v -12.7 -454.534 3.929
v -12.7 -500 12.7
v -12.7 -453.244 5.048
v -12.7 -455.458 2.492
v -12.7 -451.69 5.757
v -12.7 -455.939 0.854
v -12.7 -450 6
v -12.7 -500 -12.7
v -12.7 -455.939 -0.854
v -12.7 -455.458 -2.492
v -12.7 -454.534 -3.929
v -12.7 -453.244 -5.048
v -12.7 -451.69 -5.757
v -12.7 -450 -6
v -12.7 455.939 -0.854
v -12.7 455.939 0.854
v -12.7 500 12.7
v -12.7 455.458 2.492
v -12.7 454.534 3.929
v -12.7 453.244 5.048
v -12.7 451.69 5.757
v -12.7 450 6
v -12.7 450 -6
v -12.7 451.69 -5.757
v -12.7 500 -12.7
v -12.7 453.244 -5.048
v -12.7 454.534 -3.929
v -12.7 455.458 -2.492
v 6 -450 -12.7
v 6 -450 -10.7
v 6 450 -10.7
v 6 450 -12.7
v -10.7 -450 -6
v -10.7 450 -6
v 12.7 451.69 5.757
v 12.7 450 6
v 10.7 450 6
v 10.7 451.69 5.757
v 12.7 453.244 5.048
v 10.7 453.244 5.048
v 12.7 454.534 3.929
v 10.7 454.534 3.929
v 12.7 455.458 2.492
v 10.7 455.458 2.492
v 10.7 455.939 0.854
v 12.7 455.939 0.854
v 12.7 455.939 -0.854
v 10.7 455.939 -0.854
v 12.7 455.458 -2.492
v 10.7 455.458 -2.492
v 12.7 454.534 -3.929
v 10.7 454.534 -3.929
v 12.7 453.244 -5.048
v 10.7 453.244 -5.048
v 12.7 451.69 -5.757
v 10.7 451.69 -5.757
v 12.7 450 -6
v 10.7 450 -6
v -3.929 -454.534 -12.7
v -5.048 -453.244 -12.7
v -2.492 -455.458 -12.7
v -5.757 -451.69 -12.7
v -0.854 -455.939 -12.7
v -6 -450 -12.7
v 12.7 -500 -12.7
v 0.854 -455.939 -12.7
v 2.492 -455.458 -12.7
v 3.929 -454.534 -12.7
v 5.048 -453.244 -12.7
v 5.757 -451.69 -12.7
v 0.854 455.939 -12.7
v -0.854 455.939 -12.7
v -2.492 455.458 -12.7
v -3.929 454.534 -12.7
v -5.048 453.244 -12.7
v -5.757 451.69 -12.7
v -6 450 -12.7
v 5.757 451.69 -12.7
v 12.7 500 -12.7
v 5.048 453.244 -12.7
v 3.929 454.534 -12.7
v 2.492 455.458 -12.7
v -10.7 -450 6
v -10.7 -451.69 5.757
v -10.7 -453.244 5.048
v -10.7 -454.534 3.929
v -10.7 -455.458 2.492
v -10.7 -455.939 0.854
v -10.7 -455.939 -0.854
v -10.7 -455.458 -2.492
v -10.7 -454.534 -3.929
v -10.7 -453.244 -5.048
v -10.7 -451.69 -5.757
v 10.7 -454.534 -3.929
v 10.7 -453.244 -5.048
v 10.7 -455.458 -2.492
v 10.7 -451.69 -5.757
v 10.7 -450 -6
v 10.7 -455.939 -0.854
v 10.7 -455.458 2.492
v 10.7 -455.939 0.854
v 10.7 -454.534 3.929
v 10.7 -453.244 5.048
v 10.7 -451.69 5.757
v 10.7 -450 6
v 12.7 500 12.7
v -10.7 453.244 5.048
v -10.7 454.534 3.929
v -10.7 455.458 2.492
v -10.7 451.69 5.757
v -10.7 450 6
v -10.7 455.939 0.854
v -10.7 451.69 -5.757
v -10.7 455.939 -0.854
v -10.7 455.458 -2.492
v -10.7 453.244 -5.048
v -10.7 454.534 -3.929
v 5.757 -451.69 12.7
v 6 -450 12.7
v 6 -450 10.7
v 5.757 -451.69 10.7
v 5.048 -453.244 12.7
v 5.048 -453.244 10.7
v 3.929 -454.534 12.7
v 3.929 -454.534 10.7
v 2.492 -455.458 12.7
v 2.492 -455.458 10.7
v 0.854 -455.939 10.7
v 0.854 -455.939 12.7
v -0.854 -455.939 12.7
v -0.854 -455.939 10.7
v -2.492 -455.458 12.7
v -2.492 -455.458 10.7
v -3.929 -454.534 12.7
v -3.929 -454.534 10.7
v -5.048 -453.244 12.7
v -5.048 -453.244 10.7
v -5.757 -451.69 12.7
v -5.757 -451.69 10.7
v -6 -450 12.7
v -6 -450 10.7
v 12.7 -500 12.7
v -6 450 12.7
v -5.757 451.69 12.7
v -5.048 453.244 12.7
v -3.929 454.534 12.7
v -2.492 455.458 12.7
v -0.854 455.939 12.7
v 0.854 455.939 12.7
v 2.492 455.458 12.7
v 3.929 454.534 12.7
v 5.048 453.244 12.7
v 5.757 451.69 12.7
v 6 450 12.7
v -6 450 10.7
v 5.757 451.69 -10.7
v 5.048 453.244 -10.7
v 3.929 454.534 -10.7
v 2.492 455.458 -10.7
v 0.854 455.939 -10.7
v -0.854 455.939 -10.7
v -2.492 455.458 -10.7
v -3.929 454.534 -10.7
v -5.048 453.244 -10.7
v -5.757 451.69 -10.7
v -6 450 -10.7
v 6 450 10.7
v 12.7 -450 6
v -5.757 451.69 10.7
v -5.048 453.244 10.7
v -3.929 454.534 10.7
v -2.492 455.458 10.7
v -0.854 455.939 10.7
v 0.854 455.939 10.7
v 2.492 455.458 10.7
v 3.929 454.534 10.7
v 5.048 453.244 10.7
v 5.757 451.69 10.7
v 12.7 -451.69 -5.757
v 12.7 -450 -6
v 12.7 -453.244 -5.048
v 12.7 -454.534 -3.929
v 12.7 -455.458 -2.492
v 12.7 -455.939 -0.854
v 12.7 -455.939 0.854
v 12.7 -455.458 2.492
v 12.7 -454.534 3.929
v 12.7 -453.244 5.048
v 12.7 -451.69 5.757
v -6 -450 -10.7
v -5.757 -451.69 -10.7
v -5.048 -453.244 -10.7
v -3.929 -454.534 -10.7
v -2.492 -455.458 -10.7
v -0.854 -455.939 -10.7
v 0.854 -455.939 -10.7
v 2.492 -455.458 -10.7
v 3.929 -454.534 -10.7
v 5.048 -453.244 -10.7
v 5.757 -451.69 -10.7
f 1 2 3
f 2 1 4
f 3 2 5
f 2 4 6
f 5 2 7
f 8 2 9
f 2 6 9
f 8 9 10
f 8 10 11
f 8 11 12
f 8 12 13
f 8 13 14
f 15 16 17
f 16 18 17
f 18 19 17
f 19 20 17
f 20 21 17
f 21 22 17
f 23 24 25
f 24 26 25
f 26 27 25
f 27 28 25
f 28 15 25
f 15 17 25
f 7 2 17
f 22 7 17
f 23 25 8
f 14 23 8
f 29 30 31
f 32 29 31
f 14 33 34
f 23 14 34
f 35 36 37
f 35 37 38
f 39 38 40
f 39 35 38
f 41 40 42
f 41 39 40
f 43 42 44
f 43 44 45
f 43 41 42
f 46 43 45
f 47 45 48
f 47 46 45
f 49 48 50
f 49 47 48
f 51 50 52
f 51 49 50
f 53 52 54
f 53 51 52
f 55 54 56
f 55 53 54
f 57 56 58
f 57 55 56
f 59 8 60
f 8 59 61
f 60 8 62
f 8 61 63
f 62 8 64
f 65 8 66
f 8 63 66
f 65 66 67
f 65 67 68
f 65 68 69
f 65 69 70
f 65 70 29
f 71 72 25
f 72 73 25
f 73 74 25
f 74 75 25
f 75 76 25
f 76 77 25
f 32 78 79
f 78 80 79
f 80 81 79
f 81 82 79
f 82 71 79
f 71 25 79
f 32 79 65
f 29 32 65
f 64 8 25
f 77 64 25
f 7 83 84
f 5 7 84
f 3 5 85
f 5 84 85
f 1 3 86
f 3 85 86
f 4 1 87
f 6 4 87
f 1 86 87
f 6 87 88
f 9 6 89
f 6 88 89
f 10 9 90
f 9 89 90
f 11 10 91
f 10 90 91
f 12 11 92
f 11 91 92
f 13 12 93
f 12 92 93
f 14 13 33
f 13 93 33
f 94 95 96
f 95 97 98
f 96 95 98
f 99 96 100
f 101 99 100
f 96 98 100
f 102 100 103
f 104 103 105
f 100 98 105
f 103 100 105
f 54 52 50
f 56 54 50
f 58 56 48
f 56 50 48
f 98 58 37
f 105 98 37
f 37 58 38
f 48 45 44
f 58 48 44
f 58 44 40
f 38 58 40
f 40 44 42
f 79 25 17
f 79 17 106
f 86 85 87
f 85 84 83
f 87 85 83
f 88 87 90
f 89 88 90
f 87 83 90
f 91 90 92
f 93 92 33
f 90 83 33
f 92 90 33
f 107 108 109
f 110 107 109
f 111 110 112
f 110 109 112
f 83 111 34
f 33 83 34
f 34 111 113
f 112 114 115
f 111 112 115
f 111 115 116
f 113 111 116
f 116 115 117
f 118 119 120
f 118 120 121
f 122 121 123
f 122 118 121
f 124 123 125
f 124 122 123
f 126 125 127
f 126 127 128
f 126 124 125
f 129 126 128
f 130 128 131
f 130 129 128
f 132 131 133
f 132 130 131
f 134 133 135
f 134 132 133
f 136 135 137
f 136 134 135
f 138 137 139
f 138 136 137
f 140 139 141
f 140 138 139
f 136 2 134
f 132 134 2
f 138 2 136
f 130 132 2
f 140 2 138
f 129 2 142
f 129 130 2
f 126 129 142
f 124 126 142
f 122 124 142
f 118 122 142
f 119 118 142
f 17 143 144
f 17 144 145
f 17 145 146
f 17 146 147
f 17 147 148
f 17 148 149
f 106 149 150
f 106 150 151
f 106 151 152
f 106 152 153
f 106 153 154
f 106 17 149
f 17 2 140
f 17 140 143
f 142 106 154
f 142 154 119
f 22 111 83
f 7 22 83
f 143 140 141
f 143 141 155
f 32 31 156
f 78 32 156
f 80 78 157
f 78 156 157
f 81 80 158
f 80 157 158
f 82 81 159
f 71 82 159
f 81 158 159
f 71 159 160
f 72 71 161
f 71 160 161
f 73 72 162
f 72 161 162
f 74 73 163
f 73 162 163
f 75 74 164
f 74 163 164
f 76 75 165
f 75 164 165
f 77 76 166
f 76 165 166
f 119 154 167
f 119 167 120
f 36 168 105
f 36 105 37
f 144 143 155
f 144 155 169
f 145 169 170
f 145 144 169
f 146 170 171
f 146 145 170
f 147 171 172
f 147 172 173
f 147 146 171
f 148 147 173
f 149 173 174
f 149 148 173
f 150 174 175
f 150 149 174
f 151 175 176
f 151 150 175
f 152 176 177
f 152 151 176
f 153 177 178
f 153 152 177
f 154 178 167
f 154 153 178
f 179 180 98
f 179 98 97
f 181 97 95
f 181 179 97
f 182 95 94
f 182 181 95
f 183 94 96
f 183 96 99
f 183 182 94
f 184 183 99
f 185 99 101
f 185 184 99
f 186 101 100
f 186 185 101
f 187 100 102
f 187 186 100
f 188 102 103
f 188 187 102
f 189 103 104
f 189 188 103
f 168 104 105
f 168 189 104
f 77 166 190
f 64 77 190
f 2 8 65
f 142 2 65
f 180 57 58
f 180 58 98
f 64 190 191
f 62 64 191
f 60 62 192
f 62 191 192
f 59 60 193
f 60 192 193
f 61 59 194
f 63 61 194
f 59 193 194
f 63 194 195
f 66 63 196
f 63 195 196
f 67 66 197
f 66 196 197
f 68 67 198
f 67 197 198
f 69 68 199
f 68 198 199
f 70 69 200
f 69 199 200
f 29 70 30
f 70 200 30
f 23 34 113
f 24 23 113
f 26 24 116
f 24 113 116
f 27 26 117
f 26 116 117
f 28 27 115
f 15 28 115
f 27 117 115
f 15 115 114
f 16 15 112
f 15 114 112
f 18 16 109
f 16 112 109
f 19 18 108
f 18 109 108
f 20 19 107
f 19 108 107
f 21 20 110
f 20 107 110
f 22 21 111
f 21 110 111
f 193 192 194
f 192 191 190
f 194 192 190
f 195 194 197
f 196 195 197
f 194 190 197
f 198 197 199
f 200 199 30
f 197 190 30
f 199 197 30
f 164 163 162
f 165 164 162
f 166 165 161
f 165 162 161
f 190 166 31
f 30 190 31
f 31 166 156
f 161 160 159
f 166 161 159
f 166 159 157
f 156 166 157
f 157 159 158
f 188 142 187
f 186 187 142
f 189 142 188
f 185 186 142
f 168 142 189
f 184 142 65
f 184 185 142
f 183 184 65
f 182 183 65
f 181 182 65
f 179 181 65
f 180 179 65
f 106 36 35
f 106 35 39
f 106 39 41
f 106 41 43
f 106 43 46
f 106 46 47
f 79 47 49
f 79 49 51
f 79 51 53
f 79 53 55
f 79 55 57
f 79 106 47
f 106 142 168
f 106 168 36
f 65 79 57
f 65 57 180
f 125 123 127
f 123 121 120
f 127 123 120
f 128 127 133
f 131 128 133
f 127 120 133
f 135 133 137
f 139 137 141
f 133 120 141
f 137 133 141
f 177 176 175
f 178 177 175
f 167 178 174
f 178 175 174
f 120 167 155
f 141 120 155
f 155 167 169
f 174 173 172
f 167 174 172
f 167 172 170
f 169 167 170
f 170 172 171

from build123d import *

# Parameters (mm, degrees)
SKETCH1_W           = 25.4
SKETCH1_H           = 25.4
BOSS_EXTRUDE1_DEPTH = 500
CUT_EXTRUDE2_DEPTH  = 2
CUT_EXTRUDE3_DEPTH  = 2
CUT_EXTRUDE4_START  = -2
CUT_EXTRUDE4_DEPTH  = 2
CUT_EXTRUDE5_START  = -2
CUT_EXTRUDE5_DEPTH  = 2


with BuildPart() as part:
    # Sketch1 → Boss-Extrude1 (new, symmetric)
    with BuildSketch(Plane(origin=(0, 0, 0), x_dir=(1, 0, 0), z_dir=(0, 1, 0))):
        Rectangle(SKETCH1_W, SKETCH1_H)
    extrude(amount=BOSS_EXTRUDE1_DEPTH, both=True)

    # Sketch5 → Cut-Extrude2 (cut)
    with BuildSketch(Plane.XY.offset(12.7)):
        with BuildLine():
            Line((6, 450), (6, -450))
            ThreePointArc((6, -450), (0, -456), (-6, -450))
            Line((-6, -450), (-6, 450))
            ThreePointArc((-6, 450), (0, 456), (6, 450))
        make_face()
    extrude(amount=-CUT_EXTRUDE2_DEPTH, mode=Mode.SUBTRACT)

    # Sketch6 → Cut-Extrude3 (cut)
    with BuildSketch(Plane(origin=(12.7, 0, 0), x_dir=(0, 0, -1), z_dir=(1, 0, 0))):
        with BuildLine():
            Line((6, 450), (6, -450))
            ThreePointArc((6, -450), (0, -456), (-6, -450))
            Line((-6, -450), (-6, 450))
            ThreePointArc((-6, 450), (0, 456), (6, 450))
        make_face()
    extrude(amount=-CUT_EXTRUDE3_DEPTH, mode=Mode.SUBTRACT)

    # Sketch8 → Cut-Extrude4 (cut)
    with BuildSketch(Plane(origin=(0, 0, -12.7), x_dir=(-1, 0, 0), z_dir=(0, 0, -1)).offset(CUT_EXTRUDE4_START)):
        with BuildLine():
            Line((6, 450), (6, -450))
            ThreePointArc((6, -450), (0, -456), (-6, -450))
            Line((-6, -450), (-6, 450))
            ThreePointArc((-6, 450), (0, 456), (6, 450))
        make_face()
    extrude(amount=CUT_EXTRUDE4_DEPTH, mode=Mode.SUBTRACT)

    # Sketch9 → Cut-Extrude5 (cut)
    with BuildSketch(Plane.ZY.offset(12.7).offset(CUT_EXTRUDE5_START)):
        with BuildLine():
            Line((6, 450), (6, -450))
            ThreePointArc((6, -450), (0, -456), (-6, -450))
            Line((-6, -450), (-6, 450))
            ThreePointArc((-6, 450), (0, 456), (6, 450))
        make_face()
    extrude(amount=CUT_EXTRUDE5_DEPTH, mode=Mode.SUBTRACT)


solid = part.part
